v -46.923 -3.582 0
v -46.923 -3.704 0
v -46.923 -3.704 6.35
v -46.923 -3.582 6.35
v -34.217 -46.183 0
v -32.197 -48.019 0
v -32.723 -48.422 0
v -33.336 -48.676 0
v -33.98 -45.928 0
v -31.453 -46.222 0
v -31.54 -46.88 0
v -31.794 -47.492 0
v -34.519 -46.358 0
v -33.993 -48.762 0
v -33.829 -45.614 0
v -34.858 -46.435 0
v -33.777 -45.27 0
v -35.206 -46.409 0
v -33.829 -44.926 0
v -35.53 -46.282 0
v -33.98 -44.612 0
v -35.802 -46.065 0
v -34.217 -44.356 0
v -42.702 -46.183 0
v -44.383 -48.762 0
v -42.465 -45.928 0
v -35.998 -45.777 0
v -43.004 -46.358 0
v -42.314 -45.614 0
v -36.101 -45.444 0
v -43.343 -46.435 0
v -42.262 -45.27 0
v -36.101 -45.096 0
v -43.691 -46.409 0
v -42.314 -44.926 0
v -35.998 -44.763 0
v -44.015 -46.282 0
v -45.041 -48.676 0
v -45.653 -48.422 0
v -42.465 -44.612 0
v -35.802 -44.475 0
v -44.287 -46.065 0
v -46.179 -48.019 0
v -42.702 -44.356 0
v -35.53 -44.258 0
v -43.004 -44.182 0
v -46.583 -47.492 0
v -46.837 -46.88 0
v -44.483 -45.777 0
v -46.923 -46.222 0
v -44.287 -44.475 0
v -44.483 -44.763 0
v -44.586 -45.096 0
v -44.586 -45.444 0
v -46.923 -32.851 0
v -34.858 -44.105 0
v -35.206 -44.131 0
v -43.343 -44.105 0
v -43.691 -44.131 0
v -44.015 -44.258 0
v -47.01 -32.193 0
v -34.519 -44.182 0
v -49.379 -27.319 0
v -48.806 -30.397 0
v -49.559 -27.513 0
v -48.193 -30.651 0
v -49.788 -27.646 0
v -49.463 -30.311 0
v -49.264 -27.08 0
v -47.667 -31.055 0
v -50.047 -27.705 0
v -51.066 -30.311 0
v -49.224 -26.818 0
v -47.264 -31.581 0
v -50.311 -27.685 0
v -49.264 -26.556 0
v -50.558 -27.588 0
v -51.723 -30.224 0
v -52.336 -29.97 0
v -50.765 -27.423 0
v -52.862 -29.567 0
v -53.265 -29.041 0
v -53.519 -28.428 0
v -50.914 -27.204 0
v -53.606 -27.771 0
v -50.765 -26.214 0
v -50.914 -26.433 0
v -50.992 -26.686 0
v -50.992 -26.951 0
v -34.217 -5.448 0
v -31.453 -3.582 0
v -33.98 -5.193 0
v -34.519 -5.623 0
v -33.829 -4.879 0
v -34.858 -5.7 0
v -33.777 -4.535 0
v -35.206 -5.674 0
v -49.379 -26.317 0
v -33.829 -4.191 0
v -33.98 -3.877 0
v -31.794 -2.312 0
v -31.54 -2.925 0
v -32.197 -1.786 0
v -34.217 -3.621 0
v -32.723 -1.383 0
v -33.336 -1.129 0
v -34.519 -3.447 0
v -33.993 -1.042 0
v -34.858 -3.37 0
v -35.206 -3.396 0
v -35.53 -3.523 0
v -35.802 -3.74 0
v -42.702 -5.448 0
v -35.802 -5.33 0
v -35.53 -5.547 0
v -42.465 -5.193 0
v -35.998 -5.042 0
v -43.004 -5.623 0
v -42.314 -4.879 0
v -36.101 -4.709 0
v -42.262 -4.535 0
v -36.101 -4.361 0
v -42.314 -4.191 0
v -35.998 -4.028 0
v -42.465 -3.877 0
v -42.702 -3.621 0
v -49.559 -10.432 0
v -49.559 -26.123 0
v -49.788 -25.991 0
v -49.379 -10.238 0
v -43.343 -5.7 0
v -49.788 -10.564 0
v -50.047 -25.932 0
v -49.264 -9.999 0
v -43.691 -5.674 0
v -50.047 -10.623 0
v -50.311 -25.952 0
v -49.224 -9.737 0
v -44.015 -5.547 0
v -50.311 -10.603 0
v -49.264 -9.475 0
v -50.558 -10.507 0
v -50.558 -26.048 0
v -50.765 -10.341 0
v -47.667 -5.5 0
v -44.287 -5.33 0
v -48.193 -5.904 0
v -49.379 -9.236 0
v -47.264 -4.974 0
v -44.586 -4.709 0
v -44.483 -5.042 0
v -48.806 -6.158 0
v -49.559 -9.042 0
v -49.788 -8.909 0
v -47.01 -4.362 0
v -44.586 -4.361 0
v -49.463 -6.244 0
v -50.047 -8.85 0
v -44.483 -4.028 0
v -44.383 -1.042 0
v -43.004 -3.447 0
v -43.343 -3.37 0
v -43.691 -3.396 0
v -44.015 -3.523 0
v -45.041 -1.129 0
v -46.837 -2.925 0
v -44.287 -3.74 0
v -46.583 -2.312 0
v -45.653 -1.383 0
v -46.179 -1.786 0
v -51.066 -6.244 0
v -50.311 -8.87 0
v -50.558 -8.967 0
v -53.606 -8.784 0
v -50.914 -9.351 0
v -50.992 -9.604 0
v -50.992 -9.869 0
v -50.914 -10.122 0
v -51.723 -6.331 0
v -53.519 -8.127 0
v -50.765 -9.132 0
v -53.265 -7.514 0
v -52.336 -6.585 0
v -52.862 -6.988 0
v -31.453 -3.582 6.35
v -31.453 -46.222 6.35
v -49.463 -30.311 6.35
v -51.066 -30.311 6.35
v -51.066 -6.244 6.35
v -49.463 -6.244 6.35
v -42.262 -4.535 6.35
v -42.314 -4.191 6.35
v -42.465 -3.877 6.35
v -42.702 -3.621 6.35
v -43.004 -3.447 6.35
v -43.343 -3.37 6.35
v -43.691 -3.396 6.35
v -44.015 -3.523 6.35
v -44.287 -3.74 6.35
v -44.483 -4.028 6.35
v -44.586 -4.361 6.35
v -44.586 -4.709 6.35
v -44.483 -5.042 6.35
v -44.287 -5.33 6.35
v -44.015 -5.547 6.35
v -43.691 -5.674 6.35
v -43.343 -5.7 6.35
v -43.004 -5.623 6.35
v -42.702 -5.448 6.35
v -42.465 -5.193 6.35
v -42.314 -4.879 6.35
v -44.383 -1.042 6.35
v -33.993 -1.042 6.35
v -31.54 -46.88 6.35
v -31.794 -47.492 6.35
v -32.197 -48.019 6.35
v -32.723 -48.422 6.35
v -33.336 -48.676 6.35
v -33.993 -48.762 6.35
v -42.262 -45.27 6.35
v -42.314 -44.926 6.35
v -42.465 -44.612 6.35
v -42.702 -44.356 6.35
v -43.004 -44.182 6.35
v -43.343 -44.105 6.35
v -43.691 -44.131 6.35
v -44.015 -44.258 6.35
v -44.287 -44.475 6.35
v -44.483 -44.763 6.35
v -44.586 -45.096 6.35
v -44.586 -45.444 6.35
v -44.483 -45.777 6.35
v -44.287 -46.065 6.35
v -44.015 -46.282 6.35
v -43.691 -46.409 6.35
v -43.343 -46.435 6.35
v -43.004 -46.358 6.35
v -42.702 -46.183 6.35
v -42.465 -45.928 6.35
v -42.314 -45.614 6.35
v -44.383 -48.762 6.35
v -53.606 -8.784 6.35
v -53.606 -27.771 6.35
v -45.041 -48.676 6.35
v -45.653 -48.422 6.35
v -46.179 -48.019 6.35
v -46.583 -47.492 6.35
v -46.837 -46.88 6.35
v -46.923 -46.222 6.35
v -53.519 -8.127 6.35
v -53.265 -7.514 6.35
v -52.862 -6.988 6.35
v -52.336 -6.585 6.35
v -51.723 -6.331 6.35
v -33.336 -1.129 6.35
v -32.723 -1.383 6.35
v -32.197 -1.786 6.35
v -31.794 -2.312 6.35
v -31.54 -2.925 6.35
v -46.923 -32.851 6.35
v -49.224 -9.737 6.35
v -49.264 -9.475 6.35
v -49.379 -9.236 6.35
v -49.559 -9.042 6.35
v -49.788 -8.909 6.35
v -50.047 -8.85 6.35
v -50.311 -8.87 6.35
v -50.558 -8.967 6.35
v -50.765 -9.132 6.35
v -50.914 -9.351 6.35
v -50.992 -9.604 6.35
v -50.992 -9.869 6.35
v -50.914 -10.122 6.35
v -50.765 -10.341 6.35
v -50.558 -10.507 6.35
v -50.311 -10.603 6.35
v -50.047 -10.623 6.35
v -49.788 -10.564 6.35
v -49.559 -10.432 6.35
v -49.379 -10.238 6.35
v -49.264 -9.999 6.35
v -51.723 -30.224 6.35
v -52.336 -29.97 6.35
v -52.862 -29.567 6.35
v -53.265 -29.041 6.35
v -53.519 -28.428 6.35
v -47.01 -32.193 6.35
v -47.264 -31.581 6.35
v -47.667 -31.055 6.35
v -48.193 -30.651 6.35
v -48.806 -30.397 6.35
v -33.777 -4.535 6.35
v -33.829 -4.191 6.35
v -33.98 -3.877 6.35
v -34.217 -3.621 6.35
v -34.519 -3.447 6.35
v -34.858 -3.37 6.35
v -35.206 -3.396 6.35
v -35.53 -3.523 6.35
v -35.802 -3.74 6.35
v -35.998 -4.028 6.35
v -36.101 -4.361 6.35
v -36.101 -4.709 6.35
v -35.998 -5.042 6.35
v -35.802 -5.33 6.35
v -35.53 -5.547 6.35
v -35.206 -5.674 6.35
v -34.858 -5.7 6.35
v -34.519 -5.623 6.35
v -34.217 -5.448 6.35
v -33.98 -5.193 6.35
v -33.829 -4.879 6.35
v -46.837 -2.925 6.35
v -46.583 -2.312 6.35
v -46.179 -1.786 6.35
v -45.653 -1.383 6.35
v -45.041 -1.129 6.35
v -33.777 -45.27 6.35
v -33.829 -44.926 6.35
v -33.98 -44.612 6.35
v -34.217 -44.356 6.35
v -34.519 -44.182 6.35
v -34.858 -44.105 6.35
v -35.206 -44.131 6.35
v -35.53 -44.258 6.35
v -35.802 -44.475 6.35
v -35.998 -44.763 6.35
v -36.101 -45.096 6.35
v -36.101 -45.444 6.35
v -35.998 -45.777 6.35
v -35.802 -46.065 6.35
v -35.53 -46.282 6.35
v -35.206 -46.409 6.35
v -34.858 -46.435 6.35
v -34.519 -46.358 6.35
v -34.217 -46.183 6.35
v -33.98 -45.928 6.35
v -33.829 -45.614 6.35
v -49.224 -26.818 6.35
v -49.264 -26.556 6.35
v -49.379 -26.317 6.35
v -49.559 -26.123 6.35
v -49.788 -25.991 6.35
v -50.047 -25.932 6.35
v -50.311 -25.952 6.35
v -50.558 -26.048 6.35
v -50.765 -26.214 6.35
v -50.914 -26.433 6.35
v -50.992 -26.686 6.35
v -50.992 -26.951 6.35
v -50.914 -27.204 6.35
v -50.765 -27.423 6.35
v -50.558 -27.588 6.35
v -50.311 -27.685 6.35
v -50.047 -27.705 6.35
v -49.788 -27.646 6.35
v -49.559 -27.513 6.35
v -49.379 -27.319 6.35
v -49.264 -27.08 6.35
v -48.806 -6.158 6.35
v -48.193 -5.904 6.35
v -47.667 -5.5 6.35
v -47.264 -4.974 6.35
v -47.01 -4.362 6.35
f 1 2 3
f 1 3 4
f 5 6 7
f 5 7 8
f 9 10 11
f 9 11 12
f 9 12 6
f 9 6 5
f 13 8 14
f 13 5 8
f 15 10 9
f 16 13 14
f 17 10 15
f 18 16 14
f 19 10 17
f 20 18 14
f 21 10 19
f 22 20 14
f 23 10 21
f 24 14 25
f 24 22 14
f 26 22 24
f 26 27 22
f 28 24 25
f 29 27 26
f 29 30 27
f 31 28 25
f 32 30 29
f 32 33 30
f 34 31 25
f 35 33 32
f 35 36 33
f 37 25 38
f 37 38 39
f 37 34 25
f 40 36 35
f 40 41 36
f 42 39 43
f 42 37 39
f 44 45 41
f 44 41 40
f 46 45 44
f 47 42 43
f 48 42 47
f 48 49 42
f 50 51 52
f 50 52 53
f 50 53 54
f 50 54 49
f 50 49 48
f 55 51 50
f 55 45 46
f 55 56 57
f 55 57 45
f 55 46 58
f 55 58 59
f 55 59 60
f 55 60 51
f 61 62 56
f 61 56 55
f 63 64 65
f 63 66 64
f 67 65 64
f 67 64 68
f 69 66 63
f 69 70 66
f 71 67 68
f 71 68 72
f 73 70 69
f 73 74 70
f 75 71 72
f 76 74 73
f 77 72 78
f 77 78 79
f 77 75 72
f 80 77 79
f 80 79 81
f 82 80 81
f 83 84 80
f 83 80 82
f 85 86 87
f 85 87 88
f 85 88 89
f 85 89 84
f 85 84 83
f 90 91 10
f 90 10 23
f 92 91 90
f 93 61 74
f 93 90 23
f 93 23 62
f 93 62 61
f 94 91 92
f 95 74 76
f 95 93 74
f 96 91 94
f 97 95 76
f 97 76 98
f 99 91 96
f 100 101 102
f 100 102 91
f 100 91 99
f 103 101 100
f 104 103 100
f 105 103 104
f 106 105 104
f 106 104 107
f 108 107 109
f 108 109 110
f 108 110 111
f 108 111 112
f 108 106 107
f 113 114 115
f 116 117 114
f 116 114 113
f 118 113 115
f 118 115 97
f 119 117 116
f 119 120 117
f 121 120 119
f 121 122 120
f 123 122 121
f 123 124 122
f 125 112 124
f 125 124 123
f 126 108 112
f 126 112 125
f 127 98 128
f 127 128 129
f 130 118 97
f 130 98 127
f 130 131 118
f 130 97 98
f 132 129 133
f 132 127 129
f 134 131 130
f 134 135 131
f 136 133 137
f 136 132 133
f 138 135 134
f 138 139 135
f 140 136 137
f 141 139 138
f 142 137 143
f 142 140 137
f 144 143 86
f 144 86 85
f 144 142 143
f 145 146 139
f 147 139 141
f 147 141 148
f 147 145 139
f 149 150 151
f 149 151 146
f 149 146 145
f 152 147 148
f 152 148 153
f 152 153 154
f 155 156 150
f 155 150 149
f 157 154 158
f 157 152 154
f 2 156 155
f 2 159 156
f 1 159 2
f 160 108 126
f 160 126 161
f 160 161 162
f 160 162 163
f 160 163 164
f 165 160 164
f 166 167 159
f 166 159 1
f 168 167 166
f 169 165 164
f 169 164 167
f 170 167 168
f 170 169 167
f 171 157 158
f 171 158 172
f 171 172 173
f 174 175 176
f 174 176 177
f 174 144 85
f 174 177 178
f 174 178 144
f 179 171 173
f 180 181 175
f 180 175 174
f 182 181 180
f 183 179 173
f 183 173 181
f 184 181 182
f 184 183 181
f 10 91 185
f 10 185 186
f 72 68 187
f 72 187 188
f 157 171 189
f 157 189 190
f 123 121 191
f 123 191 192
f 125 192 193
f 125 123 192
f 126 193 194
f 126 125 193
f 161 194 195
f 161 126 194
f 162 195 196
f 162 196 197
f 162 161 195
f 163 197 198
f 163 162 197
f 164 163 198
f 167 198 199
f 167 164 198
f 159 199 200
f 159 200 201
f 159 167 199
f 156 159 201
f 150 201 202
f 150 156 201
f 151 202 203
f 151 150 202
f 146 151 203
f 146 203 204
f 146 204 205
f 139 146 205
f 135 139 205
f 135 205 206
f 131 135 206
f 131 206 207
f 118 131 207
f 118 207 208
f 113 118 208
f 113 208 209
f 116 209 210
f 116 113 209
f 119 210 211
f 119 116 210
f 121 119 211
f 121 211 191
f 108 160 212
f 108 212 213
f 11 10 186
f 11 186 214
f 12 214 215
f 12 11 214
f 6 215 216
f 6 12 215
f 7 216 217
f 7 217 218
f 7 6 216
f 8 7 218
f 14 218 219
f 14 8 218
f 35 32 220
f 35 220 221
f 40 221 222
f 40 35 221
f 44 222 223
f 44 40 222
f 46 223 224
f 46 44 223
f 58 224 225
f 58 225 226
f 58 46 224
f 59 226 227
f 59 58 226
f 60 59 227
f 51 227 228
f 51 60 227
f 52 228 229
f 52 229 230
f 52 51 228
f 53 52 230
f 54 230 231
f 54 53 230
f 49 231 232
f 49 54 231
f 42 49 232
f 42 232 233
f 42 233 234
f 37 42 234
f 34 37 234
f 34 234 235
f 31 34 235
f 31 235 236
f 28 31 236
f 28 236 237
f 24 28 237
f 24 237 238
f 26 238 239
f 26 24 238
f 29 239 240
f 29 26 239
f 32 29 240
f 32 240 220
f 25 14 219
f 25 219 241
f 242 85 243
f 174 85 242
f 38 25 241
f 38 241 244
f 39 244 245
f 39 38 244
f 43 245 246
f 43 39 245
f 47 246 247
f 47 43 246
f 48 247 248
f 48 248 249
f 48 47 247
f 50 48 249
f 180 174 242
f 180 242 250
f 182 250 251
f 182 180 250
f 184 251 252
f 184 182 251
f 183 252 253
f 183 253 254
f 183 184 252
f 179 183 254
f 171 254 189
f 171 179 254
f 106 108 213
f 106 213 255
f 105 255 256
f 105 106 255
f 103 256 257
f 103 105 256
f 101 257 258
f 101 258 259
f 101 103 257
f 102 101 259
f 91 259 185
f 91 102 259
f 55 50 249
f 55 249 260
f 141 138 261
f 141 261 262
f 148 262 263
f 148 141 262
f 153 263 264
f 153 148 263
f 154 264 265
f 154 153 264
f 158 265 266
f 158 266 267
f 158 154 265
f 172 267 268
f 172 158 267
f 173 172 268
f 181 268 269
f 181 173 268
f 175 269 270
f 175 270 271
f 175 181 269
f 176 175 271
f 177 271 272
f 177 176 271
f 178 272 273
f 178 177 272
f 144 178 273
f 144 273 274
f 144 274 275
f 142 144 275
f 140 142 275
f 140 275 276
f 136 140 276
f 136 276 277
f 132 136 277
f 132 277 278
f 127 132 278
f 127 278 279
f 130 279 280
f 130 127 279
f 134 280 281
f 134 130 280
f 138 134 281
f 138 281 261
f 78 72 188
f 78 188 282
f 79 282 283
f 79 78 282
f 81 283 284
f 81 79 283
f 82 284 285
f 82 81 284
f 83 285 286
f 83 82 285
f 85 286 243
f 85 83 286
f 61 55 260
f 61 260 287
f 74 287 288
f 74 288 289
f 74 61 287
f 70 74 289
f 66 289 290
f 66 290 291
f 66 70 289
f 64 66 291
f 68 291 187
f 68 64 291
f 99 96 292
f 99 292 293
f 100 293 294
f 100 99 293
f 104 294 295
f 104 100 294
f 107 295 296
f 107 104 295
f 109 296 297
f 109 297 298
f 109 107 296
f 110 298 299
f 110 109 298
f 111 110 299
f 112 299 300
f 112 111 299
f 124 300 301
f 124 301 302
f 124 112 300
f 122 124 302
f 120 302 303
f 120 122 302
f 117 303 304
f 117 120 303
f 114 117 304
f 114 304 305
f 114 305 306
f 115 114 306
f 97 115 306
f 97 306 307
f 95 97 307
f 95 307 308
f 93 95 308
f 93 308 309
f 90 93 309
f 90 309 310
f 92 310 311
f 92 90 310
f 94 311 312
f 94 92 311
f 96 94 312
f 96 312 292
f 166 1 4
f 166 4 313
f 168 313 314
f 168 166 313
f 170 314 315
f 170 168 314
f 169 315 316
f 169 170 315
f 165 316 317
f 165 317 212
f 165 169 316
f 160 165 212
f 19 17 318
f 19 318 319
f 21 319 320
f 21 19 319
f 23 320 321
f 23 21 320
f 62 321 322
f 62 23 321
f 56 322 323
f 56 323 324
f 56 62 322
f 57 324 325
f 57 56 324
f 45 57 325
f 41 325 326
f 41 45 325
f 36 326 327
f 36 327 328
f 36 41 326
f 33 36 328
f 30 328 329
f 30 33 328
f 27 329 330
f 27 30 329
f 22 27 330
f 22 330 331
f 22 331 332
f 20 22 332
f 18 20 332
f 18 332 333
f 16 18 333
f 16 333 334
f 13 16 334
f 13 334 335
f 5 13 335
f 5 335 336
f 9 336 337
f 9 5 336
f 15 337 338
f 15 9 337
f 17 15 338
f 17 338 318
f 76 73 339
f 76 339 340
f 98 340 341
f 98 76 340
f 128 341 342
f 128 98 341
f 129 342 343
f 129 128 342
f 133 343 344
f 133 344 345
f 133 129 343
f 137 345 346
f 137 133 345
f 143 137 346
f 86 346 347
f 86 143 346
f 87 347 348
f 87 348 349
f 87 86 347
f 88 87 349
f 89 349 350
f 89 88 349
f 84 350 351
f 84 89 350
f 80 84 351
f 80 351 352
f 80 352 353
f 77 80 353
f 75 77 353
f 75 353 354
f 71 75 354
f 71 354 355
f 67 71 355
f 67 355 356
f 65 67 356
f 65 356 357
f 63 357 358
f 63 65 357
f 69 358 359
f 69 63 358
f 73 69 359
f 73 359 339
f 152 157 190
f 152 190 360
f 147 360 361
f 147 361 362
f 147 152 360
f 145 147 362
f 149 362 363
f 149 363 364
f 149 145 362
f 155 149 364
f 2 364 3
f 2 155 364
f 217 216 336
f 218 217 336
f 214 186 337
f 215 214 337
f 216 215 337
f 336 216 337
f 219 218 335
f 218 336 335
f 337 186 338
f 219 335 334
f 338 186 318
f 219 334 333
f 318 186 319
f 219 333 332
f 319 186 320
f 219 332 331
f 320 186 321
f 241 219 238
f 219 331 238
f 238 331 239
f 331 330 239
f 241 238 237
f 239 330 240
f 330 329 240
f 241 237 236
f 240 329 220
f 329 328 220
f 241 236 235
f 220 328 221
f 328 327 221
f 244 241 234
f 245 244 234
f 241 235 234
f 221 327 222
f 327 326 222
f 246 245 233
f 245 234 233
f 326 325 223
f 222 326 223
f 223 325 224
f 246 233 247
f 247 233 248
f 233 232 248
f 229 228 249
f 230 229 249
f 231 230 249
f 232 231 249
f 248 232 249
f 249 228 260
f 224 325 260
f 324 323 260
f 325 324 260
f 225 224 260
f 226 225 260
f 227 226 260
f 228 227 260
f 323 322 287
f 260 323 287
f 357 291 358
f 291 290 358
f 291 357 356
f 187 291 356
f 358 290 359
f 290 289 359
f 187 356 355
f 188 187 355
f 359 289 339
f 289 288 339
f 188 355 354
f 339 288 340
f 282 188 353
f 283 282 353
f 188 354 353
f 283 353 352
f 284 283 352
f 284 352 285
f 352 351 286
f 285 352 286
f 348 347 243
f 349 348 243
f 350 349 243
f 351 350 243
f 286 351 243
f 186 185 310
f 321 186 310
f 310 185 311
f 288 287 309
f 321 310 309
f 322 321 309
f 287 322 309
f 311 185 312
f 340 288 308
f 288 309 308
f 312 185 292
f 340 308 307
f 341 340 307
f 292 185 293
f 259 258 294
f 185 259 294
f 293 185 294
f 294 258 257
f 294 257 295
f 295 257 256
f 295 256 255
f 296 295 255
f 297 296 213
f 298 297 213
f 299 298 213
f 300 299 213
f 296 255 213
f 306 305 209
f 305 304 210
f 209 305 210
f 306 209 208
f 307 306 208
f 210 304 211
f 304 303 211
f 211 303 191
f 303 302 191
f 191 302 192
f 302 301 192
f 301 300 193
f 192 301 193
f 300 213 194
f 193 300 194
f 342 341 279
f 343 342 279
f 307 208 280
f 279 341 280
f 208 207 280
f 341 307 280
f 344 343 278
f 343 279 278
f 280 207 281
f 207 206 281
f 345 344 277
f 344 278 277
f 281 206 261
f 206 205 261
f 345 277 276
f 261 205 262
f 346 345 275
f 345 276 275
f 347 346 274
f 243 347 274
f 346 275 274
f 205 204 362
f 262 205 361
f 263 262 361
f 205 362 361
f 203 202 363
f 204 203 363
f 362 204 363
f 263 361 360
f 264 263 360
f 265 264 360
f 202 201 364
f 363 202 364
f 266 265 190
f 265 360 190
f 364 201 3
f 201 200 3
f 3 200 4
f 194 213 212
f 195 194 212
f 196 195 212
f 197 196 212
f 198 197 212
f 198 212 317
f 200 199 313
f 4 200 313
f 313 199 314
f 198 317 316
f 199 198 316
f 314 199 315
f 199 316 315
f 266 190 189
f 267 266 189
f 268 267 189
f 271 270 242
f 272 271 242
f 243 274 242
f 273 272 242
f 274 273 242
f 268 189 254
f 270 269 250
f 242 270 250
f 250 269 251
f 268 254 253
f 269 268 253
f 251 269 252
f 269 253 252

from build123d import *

# Parameters (mm, degrees)
SKETCH1_R           = 1.1684
SKETCH1_R_2         = 0.889
BOSS_EXTRUDE1_DEPTH = 6.35


with BuildPart() as part:
    # Sketch1 → Boss-Extrude1 (new body)
    with BuildSketch(Plane.XY):
        with BuildLine():
            Line((-31.453240404, -3.582490692), (-31.453240404, -46.222490692))
            ThreePointArc((-31.453240404, -46.222490692), (-32.197189179, -48.018541916), (-33.993240404, -48.762490692))
            Line((-33.993240404, -48.762490692), (-44.383240404, -48.762490692))
            ThreePointArc((-44.383240404, -48.762490692), (-46.179291628, -48.018541916), (-46.923240404, -46.222490692))
            Line((-46.923240404, -46.222490692), (-46.923240404, -32.850740692))
            ThreePointArc((-46.923240404, -32.850740692), (-47.667189179, -31.054689467), (-49.463240404, -30.310740692))
            Line((-49.463240404, -30.310740692), (-51.065740404, -30.310740692))
            ThreePointArc((-51.065740404, -30.310740692), (-52.861791628, -29.566791916), (-53.605740404, -27.770740692))
            Line((-53.605740404, -27.770740692), (-53.605740404, -8.784240692))
            ThreePointArc((-53.605740404, -8.784240692), (-52.861791628, -6.988189467), (-51.065740404, -6.244240692))
            Line((-51.065740404, -6.244240692), (-49.463240404, -6.244240692))
            ThreePointArc((-49.463240404, -6.244240692), (-47.667189179, -5.500291916), (-46.923240404, -3.704240692))
            Line((-46.923240404, -3.704240692), (-46.923240404, -3.582490692))
            ThreePointArc((-46.923240404, -3.582490692), (-46.179291628, -1.786439467), (-44.383240404, -1.042490692))
            Line((-44.383240404, -1.042490692), (-33.993240404, -1.042490692))
            ThreePointArc((-33.993240404, -1.042490692), (-32.197189179, -1.786439467), (-31.453240404, -3.582490692))
        make_face()
        with Locations((-43.430740404, -4.534990692)):
            Circle(SKETCH1_R, mode=Mode.SUBTRACT)
        with Locations((-34.945740404, -4.534990692)):
            Circle(SKETCH1_R, mode=Mode.SUBTRACT)
        with Locations((-43.430740404, -45.269990692)):
            Circle(SKETCH1_R, mode=Mode.SUBTRACT)
        with Locations((-34.945740404, -45.269990692)):
            Circle(SKETCH1_R, mode=Mode.SUBTRACT)
        with Locations((-50.113240404, -9.736740692)):
            Circle(SKETCH1_R_2, mode=Mode.SUBTRACT)
        with Locations((-50.113240404, -26.818240692)):
            Circle(SKETCH1_R_2, mode=Mode.SUBTRACT)
    extrude(amount=BOSS_EXTRUDE1_DEPTH)


solid = part.part
